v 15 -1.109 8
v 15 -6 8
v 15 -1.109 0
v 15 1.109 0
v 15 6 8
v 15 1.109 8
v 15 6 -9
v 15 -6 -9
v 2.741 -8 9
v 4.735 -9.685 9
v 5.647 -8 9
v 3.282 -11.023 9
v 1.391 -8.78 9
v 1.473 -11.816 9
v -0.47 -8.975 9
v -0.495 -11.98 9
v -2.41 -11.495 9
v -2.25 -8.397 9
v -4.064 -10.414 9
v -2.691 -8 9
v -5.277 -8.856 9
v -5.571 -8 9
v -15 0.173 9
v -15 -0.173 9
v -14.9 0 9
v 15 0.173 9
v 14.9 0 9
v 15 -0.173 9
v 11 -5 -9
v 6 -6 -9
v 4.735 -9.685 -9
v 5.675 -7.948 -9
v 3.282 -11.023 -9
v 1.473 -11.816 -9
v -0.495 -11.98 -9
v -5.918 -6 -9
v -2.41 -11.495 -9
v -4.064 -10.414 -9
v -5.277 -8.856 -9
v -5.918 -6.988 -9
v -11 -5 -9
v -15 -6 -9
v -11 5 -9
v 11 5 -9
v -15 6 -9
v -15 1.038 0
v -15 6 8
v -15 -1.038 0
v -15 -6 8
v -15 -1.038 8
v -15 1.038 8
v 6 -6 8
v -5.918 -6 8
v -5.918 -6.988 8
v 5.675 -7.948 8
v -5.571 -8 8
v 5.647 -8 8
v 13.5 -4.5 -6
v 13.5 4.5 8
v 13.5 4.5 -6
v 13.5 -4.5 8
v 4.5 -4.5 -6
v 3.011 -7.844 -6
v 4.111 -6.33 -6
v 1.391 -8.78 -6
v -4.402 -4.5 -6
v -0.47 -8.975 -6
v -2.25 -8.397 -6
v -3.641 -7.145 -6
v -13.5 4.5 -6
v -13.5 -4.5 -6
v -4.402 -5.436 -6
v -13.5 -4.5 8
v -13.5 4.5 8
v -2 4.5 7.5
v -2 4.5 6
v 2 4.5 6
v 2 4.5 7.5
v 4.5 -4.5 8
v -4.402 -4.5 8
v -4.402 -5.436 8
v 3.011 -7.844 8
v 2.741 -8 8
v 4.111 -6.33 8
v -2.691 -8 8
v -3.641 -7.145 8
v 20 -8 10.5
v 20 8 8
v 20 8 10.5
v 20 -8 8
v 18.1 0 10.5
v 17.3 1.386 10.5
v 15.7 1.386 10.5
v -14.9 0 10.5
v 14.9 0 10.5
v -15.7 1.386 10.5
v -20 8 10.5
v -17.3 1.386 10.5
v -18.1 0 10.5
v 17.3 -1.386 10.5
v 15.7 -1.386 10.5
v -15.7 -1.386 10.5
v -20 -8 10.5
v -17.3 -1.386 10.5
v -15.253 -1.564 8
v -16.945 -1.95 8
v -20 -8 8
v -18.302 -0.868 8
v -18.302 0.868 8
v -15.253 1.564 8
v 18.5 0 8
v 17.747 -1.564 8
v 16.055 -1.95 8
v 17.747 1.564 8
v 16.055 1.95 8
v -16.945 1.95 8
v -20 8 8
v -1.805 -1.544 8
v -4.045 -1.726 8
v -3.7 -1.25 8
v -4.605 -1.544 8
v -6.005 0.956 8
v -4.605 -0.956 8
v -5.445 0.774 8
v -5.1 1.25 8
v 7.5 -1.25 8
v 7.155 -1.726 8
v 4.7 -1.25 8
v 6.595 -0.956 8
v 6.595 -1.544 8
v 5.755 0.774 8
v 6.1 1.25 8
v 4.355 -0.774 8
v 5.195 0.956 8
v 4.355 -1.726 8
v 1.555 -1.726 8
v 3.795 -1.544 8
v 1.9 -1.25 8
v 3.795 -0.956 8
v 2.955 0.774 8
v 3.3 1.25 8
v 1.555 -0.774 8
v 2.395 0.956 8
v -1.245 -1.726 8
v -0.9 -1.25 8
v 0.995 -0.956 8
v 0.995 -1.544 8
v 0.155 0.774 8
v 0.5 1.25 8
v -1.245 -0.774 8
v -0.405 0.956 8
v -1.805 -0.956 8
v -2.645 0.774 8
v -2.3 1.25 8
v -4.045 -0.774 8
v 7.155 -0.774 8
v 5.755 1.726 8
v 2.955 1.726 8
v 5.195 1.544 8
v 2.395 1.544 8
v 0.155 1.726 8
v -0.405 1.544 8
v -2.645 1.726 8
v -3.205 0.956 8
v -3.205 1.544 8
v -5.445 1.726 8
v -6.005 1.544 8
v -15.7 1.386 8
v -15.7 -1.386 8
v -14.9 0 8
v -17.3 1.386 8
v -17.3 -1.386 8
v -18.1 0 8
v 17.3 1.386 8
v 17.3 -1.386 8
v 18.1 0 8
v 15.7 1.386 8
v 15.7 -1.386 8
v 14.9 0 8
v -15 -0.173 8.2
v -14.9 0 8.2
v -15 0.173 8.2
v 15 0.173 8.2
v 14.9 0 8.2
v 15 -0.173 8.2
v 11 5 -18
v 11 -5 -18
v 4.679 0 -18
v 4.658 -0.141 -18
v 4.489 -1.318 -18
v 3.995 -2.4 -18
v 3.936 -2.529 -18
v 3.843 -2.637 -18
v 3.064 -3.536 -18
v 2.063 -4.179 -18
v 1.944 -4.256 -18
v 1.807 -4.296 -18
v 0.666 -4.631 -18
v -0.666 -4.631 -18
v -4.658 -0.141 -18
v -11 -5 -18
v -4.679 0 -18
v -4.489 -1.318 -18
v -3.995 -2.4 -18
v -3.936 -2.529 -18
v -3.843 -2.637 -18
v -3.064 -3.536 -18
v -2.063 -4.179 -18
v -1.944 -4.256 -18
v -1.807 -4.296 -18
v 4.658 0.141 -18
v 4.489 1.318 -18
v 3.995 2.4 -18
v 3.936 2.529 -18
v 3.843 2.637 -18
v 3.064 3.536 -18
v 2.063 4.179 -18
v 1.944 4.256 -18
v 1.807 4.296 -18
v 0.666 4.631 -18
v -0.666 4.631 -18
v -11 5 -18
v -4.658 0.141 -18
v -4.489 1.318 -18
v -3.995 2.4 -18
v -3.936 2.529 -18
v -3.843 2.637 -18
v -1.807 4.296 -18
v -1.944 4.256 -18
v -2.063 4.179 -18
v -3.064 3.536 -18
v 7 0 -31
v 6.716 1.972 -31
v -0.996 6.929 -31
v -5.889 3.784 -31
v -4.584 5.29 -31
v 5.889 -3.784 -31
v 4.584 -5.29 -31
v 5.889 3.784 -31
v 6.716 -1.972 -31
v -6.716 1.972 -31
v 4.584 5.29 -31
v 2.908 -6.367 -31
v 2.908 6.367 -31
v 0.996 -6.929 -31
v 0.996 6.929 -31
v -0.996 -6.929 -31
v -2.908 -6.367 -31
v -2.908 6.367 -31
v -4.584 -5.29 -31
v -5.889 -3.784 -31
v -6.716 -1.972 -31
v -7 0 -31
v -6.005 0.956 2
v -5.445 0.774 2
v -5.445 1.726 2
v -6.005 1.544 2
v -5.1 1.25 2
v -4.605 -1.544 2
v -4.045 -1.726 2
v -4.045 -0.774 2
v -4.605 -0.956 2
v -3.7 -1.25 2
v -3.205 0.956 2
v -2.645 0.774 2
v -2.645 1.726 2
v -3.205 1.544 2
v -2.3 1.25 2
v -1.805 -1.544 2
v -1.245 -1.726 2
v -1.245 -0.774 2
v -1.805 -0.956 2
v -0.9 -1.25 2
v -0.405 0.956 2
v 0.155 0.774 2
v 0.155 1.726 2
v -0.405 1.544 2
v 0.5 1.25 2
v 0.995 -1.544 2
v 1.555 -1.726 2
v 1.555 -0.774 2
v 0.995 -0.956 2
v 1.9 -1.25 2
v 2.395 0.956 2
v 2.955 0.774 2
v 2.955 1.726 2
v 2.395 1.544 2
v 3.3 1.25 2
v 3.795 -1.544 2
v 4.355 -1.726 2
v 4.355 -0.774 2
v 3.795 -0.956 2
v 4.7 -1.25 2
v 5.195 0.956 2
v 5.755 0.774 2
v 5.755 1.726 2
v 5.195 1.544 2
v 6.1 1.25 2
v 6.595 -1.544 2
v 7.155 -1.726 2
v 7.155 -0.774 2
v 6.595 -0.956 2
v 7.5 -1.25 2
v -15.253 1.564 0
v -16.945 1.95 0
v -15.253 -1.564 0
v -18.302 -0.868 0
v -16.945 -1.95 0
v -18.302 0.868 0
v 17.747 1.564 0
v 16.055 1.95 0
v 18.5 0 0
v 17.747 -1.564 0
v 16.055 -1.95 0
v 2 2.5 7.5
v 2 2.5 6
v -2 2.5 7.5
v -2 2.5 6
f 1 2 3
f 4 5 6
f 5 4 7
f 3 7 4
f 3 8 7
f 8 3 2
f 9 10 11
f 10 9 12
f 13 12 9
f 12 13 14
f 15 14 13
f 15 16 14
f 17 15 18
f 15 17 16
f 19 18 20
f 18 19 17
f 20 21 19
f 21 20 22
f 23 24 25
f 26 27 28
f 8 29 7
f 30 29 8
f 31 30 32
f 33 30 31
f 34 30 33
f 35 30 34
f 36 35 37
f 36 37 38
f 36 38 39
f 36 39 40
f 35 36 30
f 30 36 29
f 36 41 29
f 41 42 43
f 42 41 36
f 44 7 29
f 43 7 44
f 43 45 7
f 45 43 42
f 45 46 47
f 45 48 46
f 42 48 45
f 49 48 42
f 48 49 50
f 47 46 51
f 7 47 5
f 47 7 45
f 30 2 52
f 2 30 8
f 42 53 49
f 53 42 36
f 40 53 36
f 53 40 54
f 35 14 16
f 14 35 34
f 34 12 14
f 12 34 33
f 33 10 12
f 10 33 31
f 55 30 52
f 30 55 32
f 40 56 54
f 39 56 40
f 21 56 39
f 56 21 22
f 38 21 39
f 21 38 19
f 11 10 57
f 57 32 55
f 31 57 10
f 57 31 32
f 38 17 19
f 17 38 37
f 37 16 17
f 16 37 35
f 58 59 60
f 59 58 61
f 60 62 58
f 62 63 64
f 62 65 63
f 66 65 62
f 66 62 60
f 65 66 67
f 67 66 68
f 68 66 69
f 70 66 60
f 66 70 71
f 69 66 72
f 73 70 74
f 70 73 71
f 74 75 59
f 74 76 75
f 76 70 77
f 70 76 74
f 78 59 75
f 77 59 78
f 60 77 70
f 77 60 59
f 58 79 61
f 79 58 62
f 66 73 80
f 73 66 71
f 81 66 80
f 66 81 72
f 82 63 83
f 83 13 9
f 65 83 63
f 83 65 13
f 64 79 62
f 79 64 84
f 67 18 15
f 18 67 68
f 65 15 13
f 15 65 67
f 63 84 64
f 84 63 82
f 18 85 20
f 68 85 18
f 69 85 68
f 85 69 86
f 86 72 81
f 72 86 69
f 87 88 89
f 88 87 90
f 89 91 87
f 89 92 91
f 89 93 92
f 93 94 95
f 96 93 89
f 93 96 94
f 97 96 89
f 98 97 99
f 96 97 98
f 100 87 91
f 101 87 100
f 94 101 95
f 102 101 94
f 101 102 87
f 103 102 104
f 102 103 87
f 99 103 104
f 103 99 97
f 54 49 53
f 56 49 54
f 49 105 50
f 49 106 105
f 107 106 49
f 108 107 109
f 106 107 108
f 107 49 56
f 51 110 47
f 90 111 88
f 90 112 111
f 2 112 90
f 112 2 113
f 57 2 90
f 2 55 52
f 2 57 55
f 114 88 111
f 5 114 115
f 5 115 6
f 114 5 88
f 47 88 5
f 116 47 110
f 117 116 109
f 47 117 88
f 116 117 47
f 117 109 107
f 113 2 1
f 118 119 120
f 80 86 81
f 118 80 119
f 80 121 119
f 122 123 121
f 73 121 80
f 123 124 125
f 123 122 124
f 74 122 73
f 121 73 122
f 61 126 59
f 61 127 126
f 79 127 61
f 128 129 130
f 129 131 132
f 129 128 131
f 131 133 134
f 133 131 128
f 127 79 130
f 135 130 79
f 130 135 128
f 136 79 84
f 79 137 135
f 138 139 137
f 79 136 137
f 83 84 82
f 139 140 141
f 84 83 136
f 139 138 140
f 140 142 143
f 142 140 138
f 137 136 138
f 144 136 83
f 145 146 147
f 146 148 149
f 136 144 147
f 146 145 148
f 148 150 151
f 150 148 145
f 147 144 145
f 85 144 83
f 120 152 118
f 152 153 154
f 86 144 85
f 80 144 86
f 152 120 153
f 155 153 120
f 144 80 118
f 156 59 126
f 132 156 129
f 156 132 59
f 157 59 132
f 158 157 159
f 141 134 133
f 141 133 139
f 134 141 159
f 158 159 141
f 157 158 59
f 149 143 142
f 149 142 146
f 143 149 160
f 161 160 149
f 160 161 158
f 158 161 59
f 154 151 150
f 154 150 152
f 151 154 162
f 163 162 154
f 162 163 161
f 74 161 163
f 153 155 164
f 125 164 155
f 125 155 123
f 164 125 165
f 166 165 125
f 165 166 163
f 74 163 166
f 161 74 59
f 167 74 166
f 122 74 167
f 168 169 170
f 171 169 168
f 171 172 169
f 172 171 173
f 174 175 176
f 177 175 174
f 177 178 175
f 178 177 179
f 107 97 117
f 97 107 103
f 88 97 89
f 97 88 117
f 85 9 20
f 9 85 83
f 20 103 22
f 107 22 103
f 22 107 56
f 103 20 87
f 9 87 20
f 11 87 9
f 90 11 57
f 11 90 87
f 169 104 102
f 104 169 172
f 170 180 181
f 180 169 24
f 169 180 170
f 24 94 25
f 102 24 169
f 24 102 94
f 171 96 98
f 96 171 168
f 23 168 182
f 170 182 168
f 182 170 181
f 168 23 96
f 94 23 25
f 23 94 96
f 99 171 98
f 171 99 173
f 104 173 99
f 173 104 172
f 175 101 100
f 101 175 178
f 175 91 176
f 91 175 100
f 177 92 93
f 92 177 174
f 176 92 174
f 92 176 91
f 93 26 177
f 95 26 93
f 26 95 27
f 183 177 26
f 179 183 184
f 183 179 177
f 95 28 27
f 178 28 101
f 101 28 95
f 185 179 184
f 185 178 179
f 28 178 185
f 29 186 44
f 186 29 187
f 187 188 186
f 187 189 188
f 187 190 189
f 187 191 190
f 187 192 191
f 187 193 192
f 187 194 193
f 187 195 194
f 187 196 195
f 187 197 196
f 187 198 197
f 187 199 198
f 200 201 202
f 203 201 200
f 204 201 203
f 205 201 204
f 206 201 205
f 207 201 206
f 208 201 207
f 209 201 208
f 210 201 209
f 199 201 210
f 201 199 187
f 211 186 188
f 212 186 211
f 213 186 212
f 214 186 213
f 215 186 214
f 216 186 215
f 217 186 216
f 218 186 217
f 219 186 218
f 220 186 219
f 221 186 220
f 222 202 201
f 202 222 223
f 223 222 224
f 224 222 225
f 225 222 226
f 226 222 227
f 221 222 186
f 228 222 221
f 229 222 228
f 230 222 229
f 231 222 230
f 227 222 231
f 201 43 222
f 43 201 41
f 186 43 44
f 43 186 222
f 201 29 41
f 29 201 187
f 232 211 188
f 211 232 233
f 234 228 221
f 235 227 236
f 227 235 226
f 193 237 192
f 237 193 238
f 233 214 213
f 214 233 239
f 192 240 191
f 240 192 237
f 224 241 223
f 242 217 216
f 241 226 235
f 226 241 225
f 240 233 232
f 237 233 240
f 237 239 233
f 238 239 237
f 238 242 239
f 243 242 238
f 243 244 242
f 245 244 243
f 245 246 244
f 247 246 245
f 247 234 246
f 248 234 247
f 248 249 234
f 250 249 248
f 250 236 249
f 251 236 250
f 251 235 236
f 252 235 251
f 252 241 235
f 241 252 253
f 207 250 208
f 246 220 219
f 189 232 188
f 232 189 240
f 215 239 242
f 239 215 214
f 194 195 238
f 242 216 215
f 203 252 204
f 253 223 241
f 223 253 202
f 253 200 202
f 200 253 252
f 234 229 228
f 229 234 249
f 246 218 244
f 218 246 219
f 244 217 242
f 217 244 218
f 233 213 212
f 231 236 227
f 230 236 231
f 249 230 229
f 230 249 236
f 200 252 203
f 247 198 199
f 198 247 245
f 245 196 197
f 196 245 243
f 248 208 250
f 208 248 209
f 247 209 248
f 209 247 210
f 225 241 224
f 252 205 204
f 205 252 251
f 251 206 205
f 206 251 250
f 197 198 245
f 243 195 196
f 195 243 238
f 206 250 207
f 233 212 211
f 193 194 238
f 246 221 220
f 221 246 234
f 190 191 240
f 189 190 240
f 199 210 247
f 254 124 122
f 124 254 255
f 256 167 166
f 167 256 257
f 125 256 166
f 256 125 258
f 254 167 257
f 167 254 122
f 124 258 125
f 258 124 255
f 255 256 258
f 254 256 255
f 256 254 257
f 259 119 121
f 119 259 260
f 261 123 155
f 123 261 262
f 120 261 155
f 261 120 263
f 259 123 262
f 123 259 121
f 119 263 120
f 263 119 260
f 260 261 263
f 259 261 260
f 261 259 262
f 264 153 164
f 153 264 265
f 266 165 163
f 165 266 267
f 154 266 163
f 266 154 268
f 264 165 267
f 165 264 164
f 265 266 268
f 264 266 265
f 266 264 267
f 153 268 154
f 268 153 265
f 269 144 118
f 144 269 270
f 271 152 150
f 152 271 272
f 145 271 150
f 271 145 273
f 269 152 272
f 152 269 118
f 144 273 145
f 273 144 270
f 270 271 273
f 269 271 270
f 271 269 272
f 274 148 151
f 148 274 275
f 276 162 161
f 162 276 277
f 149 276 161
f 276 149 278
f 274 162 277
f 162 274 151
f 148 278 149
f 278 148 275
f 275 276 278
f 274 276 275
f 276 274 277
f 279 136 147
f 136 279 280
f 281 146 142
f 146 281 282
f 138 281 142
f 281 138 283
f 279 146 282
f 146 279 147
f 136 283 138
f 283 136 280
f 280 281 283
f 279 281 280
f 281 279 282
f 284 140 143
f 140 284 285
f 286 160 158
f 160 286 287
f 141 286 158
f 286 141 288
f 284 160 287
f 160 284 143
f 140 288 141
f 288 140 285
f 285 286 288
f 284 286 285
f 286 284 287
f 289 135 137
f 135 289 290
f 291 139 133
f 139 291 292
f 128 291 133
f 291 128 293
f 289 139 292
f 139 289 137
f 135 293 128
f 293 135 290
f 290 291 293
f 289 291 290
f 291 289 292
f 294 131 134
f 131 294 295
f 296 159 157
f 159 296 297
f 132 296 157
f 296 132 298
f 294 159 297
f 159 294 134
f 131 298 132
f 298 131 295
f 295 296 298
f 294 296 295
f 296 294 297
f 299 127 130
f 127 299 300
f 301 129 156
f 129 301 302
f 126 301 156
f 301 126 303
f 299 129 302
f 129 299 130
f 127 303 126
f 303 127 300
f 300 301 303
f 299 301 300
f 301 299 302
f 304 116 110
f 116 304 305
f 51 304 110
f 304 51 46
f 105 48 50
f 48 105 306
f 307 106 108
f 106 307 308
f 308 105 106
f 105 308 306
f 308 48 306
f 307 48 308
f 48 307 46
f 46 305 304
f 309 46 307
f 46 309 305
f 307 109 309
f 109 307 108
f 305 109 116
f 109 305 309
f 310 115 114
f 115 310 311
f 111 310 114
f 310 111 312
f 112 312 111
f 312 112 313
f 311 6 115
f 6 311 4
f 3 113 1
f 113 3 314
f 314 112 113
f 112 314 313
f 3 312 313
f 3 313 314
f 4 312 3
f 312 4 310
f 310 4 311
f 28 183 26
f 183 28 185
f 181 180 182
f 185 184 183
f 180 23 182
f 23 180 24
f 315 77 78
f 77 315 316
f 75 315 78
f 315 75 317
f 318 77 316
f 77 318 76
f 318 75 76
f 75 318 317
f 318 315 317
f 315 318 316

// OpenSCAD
// Parameters
shell_W = 30; //[15:60:1]
shell_H = 12; //[6:24:1]
shell_D = 18; //[9:36:1]
shell_wall_t = 1.5; //[0.8:3:0.1]
face_recess_D = 2; //[1:6:0.5]
flange_W = 40; //[20:80:1]
flange_H = 16; //[8:32:1]
flange_t = 2.5; //[1:6:0.5]
mount_hole_d = 3.2; //[2:6:0.1]
mount_hole_spacing = 33; //[16:66:1]
rear_block_W = 22; //[11:44:1]
rear_block_H = 10; //[5:20:1]
rear_block_D = 10; //[5:20:1]
overlap = 1; //[0.5:2:0.1]
pin_d = 1; //[0.6:2:0.1]
pin_len = 6; //[3:12:0.5]
pin_pitch_x = 2.8; //[2:4:0.1]
pin_pitch_y = 2.5; //[2:4:0.1]
jackscrew_d = 4; //[3:8:0.5]
jackscrew_len = 8; //[4:16:0.5]
boot_D = 14; //[8:28:1]
boot_r1 = 7; //[4:14:0.5]
boot_r2 = 4.5; //[2.5:10:0.5]
key_w = 4; //[2:8:0.5]
key_h = 2; //[1:5:0.5]
key_d = 1.5; //[0.8:4:0.1]
lip_t = 0.8; //[0.4:2:0.1]
lip_inset = 0.6; //[0.3:2:0.1]

// Base Shapes
module shell_outer_dshape() {
  union() {
    translate([0, 0, 0])
      cube([shell_W, shell_H, shell_D], center=true);
    translate([0, -shell_H/2, 0])
      cylinder(r=shell_H/2, h=shell_D, center=true);
  }
}

module shell_inner_dshape() {
  union() {
    translate([0, 0, shell_wall_t])
      cube([shell_W-2*shell_wall_t, shell_H-2*shell_wall_t, shell_D-2*shell_wall_t], center=true);
    translate([0, -shell_H/2+shell_wall_t, shell_wall_t])
      cylinder(r=shell_H/2-shell_wall_t, h=shell_D-2*shell_wall_t, center=true);
  }
}

module shell_hollow() {
  difference() {
    shell_outer_dshape();
    shell_inner_dshape();
  }
}

module mating_face_opening() {
  union() {
    translate([0, 0, shell_D/2-face_recess_D/2])
      cube([shell_W-2*shell_wall_t, shell_H-2*shell_wall_t, face_recess_D], center=true);
    translate([0, -shell_H/2+shell_wall_t, shell_D/2-face_recess_D/2])
      cylinder(r=shell_H/2-shell_wall_t, h=face_recess_D, center=true);
  }
}

module d_shell_housing() {
  difference() {
    shell_hollow();
    mating_face_opening();
  }
}

module mounting_flange() {
  difference() {
    union() {
      translate([0, 0, shell_D/2+flange_t/2-overlap])
        cube([flange_W, flange_H, flange_t], center=true);
      d_shell_housing();
    }
    translate([-mount_hole_spacing/2, 0, shell_D/2+flange_t/2-overlap])
      cylinder(r=mount_hole_d/2, h=flange_t+2*overlap, center=true);
    translate([mount_hole_spacing/2, 0, shell_D/2+flange_t/2-overlap])
      cylinder(r=mount_hole_d/2, h=flange_t+2*overlap, center=true);
  }
}

module rear_termination_block() {
  union() {
    mounting_flange();
    translate([0, 0, -shell_D/2-rear_block_D/2+overlap])
      cube([rear_block_W, rear_block_H, rear_block_D], center=true);
  }
}

module strain_relief_boot() {
  union() {
    rear_termination_block();
    translate([0, 0, -shell_D/2-rear_block_D-boot_D/2+2*overlap])
      cylinder(r1=boot_r1, r2=boot_r2, h=boot_D, center=true);
  }
}

module pins_or_sockets_array() {
  union() {
    for (i = [-2:2]) {
      translate([i*pin_pitch_x, pin_pitch_y/2, shell_D/2-face_recess_D-pin_len/2+overlap])
        cylinder(r=pin_d/2, h=pin_len, center=true);
      translate([i*pin_pitch_x+pin_pitch_x/2, -pin_pitch_y/2, shell_D/2-face_recess_D-pin_len/2+overlap])
        cylinder(r=pin_d/2, h=pin_len, center=true);
    }
  }
}

module jackscrews() {
  union() {
    translate([-mount_hole_spacing/2, 0, shell_D/2-face_recess_D-jackscrew_len/2+overlap])
      cylinder(r=jackscrew_d/2, h=jackscrew_len, center=true);
    translate([mount_hole_spacing/2, 0, shell_D/2-face_recess_D-jackscrew_len/2+overlap])
      cylinder(r=jackscrew_d/2, h=jackscrew_len, center=true);
  }
}

module keying_features() {
  translate([0, shell_H/2-shell_wall_t-key_h/2, shell_D/2-face_recess_D+key_d/2-overlap])
    cube([key_w, key_h, key_d], center=true);
}

module shell_lip_chamfers_fillets() {
  difference() {
    union() {
      translate([0, 0, shell_D/2-lip_t/2])
        cube([shell_W, shell_H, lip_t], center=true);
      translate([0, -shell_H/2, shell_D/2-lip_t/2])
        cylinder(r=shell_H/2, h=lip_t, center=true);
    }
    union() {
      translate([0, 0, shell_D/2-lip_t/2])
        cube([shell_W-2*lip_inset, shell_H-2*lip_inset, lip_t+2*overlap], center=true);
      translate([0, -shell_H/2+lip_inset, shell_D/2-lip_t/2])
        cylinder(r=shell_H/2-lip_inset, h=lip_t+2*overlap, center=true);
    }
  }
}

// Final Output
module connector_with_pins() {
  union() {
    strain_relief_boot();
    pins_or_sockets_array();
    jackscrews();
    keying_features();
    shell_lip_chamfers_fillets();
  }
}

// Render the connector
connector_with_pins();
